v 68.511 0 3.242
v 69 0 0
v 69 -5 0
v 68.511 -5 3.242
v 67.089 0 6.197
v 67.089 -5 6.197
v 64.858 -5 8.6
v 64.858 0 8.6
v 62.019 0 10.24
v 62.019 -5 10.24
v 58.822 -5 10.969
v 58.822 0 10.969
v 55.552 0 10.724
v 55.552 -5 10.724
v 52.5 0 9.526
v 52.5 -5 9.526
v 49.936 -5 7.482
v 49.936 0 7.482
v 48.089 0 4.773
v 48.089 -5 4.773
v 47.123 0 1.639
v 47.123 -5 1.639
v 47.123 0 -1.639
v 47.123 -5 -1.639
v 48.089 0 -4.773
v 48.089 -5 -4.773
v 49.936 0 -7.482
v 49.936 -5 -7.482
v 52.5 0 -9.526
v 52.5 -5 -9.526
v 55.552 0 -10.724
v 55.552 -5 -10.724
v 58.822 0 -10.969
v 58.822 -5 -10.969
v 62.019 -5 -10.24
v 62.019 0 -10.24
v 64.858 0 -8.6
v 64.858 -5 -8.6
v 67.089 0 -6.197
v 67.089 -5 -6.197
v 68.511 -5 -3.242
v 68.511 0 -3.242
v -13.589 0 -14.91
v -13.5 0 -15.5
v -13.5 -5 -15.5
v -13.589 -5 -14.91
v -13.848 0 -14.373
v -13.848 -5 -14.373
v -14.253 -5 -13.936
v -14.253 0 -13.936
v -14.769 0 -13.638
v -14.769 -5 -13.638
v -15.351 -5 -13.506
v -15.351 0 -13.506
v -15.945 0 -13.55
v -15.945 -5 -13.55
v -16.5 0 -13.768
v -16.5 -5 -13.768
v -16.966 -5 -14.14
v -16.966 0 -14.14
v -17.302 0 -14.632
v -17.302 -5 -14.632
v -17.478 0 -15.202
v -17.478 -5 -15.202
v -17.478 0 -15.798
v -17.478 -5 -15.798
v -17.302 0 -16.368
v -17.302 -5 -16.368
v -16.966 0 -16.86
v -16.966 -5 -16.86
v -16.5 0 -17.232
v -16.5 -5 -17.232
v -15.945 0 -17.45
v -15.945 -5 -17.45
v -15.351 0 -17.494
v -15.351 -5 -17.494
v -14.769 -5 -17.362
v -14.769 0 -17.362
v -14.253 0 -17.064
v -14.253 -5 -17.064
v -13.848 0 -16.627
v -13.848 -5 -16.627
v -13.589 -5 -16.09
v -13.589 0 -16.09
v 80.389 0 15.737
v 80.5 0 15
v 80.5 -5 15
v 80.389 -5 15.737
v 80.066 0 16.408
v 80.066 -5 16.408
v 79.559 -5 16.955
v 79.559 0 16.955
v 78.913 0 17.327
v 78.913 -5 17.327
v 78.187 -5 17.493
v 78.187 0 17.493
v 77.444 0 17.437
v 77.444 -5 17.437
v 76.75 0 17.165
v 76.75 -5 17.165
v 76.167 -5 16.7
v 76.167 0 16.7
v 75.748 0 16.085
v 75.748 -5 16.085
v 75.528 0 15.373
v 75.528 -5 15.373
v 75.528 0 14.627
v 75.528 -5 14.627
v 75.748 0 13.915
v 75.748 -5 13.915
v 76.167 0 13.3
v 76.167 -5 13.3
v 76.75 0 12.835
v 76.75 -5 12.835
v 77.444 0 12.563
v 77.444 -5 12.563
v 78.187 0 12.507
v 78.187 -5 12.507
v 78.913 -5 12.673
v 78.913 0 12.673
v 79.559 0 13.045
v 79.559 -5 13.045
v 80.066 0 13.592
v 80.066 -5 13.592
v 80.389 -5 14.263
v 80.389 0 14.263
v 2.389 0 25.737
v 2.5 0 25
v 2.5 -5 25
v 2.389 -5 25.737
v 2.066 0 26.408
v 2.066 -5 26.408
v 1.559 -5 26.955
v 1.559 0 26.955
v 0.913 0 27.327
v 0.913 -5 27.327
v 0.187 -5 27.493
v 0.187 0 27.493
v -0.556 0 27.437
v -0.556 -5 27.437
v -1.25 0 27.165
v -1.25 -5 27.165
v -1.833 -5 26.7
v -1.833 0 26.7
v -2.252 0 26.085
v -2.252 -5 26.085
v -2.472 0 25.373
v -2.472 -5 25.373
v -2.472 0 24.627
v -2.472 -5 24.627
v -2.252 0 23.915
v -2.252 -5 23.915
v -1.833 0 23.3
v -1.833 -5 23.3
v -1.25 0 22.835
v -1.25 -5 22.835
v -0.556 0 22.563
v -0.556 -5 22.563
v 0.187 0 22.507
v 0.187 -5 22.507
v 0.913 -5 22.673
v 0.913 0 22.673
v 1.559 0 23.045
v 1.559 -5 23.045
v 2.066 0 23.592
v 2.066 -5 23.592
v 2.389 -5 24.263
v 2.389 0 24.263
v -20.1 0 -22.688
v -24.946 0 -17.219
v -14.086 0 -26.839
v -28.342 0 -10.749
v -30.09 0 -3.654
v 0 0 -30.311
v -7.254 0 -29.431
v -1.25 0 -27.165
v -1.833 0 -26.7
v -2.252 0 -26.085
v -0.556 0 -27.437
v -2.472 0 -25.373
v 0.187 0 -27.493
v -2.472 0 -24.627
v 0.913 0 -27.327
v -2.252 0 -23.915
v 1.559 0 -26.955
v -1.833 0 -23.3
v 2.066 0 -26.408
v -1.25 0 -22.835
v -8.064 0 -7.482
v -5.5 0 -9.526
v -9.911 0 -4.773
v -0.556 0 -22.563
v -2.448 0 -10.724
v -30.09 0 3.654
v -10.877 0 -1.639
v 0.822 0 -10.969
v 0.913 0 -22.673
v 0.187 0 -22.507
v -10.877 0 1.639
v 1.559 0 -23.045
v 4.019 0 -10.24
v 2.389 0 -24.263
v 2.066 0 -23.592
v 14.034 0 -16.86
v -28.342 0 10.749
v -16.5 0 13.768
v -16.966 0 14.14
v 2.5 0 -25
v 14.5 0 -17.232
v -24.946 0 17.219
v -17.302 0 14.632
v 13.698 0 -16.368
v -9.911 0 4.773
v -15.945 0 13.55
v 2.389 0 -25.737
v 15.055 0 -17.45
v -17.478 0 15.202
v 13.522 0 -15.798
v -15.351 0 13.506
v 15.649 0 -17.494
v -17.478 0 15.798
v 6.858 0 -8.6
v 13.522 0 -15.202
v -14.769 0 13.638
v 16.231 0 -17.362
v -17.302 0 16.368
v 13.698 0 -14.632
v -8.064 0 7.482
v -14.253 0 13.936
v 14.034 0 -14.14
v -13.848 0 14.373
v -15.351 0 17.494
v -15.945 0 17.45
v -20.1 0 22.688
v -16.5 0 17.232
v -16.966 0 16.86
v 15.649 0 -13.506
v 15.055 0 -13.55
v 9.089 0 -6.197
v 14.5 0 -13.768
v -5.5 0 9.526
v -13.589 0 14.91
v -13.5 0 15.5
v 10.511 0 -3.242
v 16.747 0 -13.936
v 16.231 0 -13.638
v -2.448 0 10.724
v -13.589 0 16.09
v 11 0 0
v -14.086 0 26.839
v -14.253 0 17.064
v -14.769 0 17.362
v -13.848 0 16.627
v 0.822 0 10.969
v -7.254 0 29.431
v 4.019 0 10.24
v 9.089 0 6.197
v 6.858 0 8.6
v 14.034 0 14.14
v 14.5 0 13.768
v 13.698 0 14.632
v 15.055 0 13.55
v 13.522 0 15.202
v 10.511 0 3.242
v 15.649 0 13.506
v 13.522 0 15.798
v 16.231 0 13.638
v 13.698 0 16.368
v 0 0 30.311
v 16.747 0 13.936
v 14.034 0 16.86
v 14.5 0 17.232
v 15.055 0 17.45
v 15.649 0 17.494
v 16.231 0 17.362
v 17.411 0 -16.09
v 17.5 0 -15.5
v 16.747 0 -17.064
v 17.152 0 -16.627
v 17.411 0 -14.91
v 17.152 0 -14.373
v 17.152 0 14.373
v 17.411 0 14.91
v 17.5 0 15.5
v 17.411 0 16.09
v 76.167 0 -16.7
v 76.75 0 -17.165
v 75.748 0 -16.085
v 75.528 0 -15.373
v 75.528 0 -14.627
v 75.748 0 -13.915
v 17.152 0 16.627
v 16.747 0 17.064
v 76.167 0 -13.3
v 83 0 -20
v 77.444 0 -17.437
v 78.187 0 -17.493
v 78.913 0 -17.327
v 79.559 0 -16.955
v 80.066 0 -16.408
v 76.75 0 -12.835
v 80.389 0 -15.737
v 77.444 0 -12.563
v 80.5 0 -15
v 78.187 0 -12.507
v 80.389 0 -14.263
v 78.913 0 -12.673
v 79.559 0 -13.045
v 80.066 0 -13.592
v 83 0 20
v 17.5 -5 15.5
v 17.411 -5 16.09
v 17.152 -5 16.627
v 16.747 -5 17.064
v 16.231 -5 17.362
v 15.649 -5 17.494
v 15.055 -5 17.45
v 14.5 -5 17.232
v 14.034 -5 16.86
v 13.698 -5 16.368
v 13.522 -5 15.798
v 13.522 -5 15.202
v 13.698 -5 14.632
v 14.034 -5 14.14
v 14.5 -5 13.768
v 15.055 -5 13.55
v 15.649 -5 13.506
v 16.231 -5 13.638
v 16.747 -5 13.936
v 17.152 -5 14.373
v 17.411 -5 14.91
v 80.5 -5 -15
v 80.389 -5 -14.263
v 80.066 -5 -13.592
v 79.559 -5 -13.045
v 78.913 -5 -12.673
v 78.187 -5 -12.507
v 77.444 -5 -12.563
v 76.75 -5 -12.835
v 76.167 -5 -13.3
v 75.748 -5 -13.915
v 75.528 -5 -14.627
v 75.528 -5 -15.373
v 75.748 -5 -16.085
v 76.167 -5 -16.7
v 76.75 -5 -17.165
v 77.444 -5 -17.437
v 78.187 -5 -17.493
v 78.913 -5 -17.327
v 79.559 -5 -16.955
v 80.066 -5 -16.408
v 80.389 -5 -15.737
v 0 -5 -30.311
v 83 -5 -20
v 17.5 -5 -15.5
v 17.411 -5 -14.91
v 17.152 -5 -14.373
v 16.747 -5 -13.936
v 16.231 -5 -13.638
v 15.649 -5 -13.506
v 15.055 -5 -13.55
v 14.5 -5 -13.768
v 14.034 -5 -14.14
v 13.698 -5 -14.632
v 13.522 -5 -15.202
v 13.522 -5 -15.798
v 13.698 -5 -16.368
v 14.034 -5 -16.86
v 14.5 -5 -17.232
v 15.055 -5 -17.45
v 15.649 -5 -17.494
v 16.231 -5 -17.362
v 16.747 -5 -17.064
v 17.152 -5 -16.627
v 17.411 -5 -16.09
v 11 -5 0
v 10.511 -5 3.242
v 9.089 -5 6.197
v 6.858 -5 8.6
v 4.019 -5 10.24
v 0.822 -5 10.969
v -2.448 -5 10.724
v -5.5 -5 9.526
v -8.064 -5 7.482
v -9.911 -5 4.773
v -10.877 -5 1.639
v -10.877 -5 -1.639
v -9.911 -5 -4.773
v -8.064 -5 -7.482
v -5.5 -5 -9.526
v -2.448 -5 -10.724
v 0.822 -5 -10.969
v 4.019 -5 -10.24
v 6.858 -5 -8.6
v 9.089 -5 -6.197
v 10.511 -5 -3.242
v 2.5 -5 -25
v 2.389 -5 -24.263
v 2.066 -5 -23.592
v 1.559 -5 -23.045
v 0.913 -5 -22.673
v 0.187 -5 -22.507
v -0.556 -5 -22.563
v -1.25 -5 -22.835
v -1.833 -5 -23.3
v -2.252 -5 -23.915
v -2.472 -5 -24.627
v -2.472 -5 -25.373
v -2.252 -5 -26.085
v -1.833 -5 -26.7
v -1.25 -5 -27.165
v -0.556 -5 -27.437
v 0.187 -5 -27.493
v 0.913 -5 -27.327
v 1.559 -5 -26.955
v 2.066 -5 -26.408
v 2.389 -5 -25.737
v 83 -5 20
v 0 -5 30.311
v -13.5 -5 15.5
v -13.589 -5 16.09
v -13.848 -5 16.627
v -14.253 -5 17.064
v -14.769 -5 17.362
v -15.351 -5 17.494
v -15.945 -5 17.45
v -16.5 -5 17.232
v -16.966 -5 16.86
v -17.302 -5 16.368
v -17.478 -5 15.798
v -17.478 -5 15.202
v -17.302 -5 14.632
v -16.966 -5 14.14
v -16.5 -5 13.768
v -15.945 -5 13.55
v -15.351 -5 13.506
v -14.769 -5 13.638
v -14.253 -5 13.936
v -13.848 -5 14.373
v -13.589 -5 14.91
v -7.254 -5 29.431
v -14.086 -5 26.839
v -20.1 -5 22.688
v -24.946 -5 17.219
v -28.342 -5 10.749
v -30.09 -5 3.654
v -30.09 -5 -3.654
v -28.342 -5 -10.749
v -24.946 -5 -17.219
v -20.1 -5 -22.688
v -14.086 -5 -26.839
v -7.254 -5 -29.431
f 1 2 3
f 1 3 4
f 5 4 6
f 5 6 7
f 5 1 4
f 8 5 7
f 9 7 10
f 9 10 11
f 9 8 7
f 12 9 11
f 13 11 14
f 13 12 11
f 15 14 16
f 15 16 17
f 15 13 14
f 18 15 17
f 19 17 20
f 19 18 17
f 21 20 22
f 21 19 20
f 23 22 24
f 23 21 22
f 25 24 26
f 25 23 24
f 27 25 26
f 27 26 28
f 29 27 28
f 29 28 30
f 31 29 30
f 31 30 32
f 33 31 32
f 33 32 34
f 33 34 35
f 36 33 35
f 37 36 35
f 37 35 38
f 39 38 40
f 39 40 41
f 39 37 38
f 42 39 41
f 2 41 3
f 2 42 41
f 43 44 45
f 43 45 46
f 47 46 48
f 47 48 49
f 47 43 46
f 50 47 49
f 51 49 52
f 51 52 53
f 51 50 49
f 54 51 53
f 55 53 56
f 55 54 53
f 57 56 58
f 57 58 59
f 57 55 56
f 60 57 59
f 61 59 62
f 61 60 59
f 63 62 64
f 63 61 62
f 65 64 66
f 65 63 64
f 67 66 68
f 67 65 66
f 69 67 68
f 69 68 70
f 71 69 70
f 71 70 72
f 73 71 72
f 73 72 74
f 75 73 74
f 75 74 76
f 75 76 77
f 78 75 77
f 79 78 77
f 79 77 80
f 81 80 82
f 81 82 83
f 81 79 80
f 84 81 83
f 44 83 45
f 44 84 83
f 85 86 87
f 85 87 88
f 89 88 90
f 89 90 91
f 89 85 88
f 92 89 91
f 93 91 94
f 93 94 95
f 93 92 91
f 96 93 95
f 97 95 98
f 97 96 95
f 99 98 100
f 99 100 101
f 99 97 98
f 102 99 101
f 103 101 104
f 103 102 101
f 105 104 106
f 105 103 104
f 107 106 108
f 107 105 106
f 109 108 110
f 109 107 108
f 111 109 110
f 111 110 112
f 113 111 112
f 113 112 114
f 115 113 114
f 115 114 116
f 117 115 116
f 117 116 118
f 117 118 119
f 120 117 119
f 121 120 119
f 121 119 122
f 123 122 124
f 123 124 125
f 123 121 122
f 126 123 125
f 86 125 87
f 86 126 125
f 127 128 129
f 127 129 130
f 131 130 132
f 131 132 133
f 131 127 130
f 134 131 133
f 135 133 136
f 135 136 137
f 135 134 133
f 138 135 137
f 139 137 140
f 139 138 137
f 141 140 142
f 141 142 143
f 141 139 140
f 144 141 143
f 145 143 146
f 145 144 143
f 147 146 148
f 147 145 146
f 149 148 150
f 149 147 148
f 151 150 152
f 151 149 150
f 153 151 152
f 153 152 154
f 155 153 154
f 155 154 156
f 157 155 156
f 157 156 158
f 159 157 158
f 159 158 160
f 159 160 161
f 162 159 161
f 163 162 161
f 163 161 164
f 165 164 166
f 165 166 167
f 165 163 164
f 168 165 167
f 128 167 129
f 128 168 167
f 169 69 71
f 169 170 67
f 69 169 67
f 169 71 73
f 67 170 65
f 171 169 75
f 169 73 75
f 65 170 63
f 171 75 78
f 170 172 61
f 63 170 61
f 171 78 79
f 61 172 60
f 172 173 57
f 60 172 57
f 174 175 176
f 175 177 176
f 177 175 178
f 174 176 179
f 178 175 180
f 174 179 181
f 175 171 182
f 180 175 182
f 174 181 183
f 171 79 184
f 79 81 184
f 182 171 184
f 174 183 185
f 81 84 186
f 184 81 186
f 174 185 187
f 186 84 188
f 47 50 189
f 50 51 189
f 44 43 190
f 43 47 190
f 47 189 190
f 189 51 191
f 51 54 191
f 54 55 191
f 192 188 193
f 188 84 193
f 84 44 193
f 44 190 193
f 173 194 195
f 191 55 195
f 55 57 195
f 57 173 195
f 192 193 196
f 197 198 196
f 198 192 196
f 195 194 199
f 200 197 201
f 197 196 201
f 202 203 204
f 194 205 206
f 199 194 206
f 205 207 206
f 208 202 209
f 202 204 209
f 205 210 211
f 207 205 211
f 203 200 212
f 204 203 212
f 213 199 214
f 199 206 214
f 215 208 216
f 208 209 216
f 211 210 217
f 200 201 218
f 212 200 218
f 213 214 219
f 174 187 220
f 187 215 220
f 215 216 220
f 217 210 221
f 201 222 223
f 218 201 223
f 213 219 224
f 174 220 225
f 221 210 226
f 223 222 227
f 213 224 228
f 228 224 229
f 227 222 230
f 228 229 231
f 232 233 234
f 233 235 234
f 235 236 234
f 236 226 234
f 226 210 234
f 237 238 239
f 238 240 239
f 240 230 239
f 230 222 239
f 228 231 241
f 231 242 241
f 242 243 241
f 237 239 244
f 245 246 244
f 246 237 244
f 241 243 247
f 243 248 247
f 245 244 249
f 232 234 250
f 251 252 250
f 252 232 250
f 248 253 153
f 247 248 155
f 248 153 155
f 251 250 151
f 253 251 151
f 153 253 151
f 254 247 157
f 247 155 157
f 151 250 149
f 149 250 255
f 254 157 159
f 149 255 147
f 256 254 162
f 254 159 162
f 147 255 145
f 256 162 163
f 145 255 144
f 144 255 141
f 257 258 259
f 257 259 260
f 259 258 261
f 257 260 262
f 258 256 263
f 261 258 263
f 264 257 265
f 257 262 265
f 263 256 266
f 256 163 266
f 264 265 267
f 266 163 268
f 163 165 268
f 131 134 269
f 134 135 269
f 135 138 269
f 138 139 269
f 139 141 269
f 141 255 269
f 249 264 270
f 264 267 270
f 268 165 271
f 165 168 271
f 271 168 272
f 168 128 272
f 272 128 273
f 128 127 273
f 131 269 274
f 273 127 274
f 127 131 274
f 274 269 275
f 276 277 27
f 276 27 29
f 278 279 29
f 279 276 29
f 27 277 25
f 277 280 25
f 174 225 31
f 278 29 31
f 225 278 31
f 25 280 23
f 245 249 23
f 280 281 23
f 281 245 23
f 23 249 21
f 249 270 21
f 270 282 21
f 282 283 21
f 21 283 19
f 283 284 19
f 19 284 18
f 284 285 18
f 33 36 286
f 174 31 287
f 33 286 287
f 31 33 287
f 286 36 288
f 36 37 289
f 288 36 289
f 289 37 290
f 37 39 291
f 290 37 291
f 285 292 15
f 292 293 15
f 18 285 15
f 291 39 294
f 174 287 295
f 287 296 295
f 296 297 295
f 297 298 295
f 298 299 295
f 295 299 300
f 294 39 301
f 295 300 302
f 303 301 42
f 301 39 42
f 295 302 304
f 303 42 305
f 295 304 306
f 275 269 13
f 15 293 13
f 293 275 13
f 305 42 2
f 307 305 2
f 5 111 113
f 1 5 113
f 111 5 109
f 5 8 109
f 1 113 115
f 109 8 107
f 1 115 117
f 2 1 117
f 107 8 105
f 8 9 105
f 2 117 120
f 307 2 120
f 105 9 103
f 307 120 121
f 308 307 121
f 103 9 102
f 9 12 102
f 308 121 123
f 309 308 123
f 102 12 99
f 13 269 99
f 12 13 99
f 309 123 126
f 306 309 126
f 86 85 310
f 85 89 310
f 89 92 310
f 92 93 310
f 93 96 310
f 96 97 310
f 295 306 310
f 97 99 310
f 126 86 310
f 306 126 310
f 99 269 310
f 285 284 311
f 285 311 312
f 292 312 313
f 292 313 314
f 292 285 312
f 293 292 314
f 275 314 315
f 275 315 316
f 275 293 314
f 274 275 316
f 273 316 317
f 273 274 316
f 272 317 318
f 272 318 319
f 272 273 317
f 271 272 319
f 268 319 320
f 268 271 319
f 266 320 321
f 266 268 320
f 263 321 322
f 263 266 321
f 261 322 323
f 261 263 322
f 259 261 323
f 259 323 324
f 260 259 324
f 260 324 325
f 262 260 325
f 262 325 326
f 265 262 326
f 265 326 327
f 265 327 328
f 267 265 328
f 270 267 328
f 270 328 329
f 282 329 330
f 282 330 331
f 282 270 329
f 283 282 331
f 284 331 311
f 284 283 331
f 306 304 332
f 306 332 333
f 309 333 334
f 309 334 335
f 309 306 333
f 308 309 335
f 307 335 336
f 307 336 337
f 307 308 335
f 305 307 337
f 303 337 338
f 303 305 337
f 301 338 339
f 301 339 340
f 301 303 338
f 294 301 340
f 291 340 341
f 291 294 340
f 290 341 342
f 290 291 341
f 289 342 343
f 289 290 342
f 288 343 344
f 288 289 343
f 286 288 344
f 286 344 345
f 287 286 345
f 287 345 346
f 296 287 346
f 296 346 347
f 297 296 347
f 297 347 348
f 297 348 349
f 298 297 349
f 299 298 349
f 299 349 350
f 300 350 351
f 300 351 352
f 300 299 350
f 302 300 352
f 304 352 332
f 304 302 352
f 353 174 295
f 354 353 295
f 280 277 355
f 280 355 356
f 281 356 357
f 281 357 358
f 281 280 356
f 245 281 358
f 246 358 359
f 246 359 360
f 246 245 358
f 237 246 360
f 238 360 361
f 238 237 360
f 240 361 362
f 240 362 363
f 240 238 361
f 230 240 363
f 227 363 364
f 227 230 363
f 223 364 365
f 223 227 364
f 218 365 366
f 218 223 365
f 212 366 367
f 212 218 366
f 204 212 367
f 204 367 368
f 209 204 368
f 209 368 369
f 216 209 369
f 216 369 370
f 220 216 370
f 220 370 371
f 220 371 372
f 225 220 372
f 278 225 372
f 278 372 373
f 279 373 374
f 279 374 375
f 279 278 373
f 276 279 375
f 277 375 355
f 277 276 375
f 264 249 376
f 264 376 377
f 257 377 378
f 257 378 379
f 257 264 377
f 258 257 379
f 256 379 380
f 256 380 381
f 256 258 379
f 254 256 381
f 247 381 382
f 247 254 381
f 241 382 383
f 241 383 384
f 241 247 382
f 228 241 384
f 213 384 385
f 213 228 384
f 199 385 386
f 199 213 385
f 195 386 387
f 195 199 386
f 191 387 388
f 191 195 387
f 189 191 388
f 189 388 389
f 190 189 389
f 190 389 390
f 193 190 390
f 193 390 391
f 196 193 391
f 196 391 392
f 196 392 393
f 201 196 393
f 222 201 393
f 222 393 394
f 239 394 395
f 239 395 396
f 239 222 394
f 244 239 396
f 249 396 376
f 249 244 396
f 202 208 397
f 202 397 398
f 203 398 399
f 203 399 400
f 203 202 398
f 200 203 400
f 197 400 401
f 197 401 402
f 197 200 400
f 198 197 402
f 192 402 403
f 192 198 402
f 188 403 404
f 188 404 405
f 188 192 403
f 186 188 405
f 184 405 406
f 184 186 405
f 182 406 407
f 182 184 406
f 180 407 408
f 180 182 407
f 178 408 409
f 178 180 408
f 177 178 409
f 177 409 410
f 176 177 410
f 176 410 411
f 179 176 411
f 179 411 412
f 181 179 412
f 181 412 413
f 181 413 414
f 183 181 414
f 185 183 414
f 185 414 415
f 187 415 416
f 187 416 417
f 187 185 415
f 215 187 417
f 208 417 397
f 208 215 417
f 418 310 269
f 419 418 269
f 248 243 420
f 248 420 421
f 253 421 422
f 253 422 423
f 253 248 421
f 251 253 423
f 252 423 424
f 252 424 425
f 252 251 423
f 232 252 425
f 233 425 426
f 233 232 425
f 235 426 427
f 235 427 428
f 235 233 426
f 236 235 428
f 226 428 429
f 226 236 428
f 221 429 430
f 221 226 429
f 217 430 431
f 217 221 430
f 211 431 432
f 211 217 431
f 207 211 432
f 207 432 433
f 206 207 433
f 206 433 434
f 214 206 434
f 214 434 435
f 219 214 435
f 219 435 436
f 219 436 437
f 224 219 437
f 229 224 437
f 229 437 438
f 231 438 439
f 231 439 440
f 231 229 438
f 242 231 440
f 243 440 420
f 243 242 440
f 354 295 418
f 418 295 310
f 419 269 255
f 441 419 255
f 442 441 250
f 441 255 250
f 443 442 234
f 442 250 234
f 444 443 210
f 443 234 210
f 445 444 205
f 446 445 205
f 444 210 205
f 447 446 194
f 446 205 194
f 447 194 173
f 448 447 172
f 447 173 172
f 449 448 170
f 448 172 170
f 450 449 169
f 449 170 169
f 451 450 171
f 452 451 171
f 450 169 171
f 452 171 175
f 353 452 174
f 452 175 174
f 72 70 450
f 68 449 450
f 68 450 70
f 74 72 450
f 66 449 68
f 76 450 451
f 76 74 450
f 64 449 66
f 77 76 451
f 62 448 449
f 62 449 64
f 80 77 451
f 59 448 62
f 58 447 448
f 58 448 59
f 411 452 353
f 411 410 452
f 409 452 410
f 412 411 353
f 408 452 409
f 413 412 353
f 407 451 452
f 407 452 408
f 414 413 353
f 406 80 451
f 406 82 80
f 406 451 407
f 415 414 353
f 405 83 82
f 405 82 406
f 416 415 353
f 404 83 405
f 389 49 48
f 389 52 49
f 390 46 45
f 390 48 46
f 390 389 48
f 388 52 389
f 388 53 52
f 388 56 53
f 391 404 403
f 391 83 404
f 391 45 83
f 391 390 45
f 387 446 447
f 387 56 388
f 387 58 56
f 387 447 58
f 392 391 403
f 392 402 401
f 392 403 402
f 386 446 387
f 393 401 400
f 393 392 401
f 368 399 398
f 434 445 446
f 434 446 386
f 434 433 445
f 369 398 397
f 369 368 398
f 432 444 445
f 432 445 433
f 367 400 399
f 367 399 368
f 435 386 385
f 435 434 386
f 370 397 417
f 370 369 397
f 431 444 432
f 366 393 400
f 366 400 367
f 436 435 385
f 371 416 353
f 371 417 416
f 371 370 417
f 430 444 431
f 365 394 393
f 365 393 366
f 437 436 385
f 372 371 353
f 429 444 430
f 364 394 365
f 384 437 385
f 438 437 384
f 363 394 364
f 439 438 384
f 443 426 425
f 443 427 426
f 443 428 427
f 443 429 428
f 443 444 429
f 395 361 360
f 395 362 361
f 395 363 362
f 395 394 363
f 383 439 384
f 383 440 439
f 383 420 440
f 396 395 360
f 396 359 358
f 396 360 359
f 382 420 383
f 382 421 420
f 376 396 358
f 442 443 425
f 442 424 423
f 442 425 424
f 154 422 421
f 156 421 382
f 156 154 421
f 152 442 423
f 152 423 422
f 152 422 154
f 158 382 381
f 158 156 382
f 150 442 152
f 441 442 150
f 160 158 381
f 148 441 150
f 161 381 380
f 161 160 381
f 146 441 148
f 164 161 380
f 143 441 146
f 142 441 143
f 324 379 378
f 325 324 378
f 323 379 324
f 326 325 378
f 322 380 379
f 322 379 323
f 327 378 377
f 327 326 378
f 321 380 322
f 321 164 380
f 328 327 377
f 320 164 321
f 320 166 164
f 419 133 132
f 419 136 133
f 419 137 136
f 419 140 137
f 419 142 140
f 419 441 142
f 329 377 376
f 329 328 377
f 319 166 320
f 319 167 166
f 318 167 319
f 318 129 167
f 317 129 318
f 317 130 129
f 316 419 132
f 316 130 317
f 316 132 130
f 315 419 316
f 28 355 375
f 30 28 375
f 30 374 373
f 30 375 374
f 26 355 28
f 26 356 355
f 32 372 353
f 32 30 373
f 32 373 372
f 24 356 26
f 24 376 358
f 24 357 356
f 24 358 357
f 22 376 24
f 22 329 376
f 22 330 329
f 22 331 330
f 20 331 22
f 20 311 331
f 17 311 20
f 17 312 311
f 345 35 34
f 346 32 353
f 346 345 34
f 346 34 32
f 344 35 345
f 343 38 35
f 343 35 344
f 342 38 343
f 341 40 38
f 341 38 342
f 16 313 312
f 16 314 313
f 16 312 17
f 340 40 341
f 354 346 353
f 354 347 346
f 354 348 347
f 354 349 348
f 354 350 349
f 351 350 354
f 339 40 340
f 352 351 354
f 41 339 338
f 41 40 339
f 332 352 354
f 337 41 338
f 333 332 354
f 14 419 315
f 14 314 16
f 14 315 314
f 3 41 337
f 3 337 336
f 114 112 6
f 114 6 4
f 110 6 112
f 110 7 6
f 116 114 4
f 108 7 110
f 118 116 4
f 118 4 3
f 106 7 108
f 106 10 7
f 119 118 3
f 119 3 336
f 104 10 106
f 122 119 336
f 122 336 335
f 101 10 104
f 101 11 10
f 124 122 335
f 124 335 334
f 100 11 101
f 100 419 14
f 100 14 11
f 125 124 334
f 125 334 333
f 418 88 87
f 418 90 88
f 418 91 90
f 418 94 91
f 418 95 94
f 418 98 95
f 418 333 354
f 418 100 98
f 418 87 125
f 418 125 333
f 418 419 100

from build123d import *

# Parameters (mm, degrees)
F0_R     = 11
F0_R_2   = 2
F0_R_3   = 2.5
F1_DEPTH = 5


with BuildPart() as f1:
    # F0 (on Front) → F1 (new body)
    with BuildSketch(Plane.XZ):
        with Locations((58, 0)):
            Circle(F0_R)
        with BuildLine():
            ThreePointArc((0, 30.311465), (-30.311465, 0), (0, -30.311465))
            Line((0, -30.311465), (83, -20))
            Line((83, -20), (83, 0))
            Line((83, 0), (83, 20))
            Line((83, 20), (0, 30.311465))
        make_face()
        with Locations((-15.5, -15.5)):
            Circle(F0_R_2, mode=Mode.SUBTRACT)
        with Locations((0, -25)):
            Circle(F0_R_3, mode=Mode.SUBTRACT)
        with Locations((15.5, -15.5)):
            Circle(F0_R_2, mode=Mode.SUBTRACT)
        with Locations((78, -15)):
            Circle(F0_R_3, mode=Mode.SUBTRACT)
        Circle(F0_R, mode=Mode.SUBTRACT)
        with Locations((-15.5, 15.5)):
            Circle(F0_R_2, mode=Mode.SUBTRACT)
        with Locations((15.5, 15.5)):
            Circle(F0_R_2, mode=Mode.SUBTRACT)
        with Locations((0, 25)):
            Circle(F0_R_3, mode=Mode.SUBTRACT)
        with Locations((58, 0)):
            Circle(F0_R, mode=Mode.SUBTRACT)
        with Locations((78, 15)):
            Circle(F0_R_3, mode=Mode.SUBTRACT)
    extrude(amount=F1_DEPTH)


solid = f1.part
